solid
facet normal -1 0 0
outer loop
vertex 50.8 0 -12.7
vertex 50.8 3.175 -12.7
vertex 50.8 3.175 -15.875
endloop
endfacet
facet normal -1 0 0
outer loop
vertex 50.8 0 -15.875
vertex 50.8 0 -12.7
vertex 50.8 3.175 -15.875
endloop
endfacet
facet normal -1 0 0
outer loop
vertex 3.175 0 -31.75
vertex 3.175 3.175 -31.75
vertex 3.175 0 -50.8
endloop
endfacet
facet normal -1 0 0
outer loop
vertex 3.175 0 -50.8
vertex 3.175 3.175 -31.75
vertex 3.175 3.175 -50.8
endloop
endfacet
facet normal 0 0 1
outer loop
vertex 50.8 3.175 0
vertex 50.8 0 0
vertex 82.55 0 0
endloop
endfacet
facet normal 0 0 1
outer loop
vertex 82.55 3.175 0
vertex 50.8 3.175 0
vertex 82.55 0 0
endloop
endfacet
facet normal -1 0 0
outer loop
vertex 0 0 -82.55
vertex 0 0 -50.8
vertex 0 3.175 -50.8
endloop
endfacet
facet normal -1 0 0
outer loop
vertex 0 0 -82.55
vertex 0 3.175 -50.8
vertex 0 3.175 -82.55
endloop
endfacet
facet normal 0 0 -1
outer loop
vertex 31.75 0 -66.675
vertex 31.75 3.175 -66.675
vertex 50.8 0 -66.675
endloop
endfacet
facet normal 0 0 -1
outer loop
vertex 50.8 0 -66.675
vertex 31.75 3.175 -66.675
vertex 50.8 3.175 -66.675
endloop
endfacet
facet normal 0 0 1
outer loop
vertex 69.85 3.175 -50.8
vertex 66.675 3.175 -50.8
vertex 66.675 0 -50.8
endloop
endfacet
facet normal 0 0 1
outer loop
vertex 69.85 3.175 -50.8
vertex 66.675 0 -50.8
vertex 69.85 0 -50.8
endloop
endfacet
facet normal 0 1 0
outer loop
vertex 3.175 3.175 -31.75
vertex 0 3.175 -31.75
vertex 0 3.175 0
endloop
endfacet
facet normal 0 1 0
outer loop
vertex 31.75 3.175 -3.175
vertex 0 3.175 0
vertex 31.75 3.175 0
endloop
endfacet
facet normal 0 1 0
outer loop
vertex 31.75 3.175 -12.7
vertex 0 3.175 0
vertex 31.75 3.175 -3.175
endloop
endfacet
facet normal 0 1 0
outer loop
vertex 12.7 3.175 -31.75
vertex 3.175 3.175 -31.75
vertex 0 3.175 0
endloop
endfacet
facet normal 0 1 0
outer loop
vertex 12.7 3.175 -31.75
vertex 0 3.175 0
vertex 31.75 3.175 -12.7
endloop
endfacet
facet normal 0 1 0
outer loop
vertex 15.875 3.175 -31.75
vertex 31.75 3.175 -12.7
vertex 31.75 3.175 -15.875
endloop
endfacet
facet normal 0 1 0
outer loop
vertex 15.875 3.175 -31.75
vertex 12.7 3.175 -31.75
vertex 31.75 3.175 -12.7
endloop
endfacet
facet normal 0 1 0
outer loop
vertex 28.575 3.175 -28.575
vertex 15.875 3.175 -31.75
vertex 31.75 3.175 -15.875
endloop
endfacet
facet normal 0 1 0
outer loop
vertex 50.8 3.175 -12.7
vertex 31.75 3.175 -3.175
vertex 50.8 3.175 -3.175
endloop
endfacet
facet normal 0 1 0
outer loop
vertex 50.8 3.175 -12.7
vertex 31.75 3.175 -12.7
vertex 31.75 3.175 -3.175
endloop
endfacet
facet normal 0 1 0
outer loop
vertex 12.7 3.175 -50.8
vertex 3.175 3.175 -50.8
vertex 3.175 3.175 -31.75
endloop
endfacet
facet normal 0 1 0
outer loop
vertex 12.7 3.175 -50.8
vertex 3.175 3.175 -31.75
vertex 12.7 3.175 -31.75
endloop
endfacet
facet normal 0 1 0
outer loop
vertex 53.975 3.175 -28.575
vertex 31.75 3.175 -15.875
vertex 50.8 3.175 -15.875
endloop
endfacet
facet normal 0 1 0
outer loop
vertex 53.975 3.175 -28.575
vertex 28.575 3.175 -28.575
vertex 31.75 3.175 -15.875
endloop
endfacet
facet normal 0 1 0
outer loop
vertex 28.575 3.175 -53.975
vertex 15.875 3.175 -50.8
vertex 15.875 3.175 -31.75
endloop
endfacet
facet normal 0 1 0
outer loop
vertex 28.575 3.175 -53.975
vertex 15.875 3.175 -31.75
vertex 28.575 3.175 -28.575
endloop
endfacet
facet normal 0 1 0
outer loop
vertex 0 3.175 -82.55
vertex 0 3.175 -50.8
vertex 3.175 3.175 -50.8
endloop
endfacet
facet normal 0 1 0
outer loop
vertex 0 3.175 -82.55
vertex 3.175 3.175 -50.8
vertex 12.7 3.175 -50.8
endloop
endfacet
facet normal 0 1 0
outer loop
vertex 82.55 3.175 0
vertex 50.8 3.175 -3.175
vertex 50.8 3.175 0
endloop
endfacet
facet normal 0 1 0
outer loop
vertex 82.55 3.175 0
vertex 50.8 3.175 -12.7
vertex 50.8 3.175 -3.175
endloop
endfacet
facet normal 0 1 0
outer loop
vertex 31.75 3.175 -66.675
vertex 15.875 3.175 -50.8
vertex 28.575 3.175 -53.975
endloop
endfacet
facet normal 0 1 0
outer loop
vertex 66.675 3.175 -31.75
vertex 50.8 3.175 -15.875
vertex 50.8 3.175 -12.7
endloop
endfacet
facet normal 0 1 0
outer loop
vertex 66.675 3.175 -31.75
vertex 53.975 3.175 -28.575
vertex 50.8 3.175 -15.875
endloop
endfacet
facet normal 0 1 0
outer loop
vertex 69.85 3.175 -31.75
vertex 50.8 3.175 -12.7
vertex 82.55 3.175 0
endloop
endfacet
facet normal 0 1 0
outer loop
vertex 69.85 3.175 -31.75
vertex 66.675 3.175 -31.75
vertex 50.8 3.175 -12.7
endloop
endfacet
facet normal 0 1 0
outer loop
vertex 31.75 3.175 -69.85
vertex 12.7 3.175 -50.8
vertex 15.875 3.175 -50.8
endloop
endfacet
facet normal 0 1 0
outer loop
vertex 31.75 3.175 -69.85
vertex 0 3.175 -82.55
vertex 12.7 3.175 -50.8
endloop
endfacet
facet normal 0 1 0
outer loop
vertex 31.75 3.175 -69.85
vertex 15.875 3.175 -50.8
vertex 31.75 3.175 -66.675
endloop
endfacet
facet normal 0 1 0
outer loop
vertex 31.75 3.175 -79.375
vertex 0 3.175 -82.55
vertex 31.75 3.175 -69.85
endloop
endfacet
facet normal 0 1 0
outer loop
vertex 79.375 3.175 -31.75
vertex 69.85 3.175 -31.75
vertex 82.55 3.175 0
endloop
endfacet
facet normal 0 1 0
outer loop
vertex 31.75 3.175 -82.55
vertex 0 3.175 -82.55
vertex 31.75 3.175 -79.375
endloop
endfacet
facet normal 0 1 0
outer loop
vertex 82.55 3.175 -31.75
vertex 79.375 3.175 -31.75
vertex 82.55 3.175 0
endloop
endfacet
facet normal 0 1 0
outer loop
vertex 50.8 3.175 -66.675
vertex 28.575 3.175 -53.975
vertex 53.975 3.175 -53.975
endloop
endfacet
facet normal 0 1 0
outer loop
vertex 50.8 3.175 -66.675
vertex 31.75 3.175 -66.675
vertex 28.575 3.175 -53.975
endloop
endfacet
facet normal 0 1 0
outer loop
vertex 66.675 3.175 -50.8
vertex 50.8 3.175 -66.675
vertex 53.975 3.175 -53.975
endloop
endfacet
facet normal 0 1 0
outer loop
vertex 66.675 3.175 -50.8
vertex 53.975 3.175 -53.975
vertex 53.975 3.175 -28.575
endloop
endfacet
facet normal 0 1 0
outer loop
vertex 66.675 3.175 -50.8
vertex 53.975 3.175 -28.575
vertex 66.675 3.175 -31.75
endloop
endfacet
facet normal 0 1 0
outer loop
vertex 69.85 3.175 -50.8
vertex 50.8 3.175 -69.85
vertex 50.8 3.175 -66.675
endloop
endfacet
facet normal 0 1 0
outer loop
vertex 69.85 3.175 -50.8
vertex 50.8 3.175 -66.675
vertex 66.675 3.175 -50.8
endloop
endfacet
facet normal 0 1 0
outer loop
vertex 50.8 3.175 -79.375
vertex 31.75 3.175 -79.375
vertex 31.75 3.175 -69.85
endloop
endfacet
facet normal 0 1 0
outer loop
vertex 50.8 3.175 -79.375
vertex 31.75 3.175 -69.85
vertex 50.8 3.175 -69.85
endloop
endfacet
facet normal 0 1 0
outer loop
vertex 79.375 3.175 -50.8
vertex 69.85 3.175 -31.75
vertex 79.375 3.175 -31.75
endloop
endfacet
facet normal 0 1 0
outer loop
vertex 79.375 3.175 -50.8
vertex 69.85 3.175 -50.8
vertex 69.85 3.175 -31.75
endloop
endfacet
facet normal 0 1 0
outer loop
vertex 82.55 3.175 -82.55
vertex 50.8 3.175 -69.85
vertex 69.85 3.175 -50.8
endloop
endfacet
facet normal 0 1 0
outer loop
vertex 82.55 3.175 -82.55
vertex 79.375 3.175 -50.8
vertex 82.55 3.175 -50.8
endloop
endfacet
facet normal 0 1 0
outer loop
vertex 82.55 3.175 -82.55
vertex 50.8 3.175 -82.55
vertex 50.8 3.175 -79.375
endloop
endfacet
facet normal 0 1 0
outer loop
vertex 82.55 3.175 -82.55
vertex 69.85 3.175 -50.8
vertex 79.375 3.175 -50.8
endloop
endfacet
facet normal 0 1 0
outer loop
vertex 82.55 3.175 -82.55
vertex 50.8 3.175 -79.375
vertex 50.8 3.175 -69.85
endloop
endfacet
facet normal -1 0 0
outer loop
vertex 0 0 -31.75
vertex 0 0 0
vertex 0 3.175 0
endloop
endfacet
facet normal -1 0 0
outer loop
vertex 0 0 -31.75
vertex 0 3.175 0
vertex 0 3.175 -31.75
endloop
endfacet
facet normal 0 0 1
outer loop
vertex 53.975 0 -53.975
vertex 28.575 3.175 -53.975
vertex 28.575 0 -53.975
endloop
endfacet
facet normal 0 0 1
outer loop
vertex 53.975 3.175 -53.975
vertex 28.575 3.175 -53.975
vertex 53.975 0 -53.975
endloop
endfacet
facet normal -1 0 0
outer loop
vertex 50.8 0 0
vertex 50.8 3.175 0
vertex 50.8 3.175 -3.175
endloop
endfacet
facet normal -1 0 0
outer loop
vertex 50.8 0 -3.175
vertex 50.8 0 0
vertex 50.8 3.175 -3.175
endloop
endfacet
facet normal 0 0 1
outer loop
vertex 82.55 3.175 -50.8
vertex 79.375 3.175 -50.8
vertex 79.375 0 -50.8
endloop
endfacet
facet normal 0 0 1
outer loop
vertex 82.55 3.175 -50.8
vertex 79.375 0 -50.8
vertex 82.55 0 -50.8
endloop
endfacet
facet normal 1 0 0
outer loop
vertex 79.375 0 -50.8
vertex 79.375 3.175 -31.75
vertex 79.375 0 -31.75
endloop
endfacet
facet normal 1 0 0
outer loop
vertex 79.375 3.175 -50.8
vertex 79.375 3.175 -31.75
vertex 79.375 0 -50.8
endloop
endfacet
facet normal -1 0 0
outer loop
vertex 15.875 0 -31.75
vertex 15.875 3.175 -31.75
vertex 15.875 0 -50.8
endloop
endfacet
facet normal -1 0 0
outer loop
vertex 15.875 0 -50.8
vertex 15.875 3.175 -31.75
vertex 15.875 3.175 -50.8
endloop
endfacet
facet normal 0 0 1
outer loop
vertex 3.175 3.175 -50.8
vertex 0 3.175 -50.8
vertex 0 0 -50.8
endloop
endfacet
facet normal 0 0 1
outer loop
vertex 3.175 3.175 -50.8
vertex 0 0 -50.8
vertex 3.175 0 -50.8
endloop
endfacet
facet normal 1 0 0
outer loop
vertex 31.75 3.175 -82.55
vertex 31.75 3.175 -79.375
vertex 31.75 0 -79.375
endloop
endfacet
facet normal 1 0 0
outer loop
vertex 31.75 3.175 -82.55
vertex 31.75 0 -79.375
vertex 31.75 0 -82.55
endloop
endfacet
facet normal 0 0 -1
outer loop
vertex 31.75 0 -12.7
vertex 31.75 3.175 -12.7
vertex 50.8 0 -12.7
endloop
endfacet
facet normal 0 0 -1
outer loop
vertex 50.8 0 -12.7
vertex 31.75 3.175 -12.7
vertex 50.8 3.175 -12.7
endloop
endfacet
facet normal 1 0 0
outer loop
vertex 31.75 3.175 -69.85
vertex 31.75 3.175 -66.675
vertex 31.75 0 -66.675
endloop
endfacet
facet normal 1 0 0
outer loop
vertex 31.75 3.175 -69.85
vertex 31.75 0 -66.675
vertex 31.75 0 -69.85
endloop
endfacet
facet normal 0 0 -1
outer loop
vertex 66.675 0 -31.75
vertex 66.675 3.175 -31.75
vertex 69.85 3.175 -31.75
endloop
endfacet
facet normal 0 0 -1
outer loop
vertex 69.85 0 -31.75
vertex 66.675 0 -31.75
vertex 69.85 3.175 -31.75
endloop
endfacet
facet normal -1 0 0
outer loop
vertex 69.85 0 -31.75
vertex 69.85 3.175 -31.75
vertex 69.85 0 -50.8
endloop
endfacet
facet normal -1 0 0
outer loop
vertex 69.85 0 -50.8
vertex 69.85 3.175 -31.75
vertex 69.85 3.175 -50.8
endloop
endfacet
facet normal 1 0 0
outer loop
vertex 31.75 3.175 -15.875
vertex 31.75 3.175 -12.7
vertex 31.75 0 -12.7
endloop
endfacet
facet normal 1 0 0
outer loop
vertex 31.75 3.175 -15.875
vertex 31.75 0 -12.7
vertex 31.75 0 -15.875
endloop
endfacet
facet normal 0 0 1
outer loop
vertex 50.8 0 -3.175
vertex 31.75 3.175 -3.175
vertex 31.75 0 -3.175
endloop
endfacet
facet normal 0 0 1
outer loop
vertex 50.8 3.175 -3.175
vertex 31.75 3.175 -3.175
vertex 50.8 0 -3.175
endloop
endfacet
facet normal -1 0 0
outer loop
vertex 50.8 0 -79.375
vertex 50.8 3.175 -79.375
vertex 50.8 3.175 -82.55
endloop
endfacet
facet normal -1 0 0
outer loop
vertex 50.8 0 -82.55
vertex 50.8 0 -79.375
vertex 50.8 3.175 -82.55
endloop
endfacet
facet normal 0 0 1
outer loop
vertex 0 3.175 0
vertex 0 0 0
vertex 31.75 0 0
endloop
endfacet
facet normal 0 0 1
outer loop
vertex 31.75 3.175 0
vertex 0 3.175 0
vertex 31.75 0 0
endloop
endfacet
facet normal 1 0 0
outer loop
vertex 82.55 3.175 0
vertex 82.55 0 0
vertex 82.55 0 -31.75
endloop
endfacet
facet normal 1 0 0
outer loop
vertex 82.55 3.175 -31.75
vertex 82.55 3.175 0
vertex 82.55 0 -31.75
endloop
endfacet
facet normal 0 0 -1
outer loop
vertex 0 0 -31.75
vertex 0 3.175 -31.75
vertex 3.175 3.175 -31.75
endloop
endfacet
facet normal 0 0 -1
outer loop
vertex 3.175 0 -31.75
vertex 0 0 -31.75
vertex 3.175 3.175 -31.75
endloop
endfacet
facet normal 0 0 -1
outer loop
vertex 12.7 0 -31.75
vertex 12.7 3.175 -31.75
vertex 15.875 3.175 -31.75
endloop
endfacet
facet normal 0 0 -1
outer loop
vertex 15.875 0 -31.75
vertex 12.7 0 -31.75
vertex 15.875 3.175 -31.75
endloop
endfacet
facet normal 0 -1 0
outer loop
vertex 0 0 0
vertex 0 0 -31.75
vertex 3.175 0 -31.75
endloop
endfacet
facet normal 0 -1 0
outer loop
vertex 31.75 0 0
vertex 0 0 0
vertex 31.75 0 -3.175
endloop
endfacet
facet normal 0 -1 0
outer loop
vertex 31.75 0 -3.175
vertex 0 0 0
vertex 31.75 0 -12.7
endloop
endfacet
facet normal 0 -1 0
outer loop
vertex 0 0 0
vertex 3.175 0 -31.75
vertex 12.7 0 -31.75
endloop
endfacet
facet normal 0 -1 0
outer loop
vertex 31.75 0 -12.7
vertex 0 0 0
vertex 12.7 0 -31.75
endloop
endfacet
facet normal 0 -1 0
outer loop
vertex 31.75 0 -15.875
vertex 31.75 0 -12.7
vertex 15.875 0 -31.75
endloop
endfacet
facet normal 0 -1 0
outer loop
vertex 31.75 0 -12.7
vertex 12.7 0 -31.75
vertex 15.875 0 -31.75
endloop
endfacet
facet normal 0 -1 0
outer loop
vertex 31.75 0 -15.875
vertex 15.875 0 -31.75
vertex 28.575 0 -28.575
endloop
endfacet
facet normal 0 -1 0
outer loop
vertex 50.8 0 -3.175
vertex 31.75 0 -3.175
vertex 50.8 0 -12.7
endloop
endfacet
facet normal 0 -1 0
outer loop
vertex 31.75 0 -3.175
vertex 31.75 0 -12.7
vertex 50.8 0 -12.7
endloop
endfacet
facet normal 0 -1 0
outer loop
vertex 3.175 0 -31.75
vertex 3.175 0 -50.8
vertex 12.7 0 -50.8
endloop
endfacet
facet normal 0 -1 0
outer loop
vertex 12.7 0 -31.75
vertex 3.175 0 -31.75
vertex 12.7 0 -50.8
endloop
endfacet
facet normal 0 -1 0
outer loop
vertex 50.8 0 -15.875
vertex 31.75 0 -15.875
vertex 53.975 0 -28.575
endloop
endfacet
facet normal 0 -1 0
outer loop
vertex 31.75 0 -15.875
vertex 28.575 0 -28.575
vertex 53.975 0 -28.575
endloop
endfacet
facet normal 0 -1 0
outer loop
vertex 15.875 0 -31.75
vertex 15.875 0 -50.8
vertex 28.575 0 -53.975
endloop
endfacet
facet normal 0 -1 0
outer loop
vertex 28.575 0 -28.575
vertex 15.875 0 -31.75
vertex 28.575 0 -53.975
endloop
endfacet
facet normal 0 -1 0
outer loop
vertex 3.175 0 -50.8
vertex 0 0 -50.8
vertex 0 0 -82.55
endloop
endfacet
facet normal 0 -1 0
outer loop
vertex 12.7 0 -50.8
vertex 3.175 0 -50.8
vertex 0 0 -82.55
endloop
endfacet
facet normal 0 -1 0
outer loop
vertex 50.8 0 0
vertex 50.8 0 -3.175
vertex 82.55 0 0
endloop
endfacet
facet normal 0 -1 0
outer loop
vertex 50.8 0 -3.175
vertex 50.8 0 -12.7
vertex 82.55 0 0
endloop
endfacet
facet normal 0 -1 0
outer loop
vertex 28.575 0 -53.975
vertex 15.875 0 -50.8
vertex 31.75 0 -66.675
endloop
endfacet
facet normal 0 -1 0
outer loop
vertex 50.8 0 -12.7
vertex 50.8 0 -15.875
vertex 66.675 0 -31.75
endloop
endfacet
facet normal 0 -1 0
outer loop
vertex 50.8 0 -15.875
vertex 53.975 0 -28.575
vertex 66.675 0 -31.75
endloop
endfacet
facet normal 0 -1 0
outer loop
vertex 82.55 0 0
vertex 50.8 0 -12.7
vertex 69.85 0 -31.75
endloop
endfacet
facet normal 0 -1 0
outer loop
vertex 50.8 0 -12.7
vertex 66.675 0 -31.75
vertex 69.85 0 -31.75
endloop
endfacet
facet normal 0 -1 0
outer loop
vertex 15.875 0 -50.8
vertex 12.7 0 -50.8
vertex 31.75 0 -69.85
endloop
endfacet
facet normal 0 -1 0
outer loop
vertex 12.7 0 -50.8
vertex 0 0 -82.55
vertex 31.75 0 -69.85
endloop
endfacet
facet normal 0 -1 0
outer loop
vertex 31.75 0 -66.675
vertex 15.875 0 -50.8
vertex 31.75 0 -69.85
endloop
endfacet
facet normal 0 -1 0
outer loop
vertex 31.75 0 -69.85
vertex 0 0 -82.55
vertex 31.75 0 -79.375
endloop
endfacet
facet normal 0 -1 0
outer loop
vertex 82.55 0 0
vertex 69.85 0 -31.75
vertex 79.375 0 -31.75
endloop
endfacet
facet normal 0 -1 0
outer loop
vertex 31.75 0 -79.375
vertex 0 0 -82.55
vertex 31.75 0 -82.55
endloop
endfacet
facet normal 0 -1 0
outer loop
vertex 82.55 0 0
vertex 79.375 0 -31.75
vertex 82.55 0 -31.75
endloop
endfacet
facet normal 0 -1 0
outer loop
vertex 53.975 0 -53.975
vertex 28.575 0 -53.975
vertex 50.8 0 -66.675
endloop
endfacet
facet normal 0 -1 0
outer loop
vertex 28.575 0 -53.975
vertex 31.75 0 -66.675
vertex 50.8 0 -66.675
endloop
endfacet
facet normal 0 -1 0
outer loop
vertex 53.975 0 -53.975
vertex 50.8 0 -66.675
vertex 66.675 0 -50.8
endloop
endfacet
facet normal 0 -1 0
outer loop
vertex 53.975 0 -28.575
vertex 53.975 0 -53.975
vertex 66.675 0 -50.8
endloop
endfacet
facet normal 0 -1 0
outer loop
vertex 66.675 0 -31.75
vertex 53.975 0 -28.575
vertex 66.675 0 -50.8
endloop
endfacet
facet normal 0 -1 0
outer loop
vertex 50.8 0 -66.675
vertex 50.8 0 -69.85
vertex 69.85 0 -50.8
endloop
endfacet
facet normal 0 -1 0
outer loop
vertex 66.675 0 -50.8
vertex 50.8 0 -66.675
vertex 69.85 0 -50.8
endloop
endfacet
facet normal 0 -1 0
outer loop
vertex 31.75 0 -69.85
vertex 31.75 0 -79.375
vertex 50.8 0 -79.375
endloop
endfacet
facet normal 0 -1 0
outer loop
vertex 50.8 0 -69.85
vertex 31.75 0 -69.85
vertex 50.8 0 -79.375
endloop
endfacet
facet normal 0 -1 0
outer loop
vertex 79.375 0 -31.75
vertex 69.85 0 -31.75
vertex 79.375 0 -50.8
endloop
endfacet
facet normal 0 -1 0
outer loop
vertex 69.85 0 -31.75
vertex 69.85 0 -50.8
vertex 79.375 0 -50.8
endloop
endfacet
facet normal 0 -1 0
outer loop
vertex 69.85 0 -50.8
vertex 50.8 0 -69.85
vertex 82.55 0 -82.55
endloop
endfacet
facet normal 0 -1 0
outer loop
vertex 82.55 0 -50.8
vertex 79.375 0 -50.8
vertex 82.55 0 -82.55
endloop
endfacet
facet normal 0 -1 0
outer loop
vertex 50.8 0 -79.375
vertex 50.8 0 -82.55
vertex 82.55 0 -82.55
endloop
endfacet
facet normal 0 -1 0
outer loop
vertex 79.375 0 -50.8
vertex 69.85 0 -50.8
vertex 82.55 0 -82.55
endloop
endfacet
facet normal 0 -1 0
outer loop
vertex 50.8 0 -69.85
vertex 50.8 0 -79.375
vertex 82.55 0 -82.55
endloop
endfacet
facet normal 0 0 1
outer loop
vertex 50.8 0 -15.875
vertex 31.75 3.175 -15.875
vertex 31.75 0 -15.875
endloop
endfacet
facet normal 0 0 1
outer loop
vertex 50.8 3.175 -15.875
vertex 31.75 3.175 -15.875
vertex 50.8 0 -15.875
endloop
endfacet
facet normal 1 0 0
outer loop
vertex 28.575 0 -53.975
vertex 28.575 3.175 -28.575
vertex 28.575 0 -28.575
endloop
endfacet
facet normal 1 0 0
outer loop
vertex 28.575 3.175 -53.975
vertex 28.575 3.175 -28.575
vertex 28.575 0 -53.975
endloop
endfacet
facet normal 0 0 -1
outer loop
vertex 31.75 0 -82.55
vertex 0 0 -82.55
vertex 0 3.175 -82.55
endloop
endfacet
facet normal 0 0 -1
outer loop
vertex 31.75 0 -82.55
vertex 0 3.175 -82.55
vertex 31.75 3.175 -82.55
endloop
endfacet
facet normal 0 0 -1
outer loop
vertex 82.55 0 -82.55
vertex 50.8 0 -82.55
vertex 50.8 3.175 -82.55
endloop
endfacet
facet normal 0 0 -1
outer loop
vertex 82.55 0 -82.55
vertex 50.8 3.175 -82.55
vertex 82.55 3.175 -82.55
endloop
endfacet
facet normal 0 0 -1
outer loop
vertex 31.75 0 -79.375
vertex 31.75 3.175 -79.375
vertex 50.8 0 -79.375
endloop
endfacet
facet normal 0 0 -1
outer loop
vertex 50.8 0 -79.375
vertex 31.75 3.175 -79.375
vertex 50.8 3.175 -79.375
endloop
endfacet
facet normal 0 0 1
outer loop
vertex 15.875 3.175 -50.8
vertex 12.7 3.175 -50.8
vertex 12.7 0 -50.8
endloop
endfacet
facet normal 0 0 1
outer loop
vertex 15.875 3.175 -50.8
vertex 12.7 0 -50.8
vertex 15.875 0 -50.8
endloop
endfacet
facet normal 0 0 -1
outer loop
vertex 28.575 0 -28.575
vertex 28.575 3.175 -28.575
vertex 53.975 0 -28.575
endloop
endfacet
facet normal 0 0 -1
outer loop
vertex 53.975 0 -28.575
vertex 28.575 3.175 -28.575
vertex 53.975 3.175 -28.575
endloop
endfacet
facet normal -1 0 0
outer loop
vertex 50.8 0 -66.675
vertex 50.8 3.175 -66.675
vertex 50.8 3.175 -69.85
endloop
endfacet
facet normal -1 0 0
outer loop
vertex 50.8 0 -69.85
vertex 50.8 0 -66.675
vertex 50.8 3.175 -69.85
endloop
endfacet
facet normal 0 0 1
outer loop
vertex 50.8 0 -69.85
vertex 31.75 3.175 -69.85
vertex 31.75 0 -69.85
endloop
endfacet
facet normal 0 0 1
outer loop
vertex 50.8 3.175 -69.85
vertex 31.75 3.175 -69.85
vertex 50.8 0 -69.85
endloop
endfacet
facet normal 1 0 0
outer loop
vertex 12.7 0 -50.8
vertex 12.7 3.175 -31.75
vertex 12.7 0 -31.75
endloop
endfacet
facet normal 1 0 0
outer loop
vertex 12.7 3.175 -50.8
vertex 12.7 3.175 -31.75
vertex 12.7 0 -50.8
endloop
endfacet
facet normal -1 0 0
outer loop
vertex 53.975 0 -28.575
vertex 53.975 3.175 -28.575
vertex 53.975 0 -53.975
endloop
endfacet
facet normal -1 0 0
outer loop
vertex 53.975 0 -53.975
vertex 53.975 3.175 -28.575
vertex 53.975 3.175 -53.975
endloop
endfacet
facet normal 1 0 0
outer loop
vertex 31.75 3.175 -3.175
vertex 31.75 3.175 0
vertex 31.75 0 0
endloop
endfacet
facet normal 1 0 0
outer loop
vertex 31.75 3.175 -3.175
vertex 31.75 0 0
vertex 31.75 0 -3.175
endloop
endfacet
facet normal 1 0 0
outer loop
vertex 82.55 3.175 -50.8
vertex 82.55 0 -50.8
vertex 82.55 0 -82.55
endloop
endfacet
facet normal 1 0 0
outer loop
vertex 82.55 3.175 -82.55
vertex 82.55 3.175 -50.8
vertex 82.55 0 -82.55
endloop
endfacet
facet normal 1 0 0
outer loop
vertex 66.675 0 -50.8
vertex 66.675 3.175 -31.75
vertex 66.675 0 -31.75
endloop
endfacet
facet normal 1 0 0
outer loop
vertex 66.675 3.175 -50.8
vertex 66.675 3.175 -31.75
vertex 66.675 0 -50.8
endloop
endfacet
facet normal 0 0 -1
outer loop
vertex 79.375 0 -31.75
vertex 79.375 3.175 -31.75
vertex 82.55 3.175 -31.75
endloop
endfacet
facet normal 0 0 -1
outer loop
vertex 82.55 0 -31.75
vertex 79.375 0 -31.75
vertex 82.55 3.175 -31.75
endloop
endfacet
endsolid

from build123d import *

# Parameters (mm, degrees)
SKETCH1_W           = 82.55
SKETCH1_H           = 82.55
BOSS_EXTRUDE1_DEPTH = 3.175
SKETCH2_W           = 25.4
SKETCH2_H           = 25.4
SKETCH2_W_2         = 19.05
SKETCH2_H_2         = 3.175
SKETCH2_W_3         = 3.175
SKETCH2_H_3         = 19.05
CUT_EXTRUDE1_DEPTH  = 3.175
SKETCH3_W           = 19.05
SKETCH3_H           = 3.175
SKETCH3_W_2         = 3.175
SKETCH3_H_2         = 19.05
CUT_EXTRUDE2_DEPTH  = 3.175


with BuildPart() as part:
    # Sketch1 → Boss-Extrude1 (new body)
    with BuildSketch(Plane(origin=(0, 0, 0), x_dir=(1, 0, 0), z_dir=(0, 1, 0))):
        with Locations((41.275, 41.275)):
            Rectangle(SKETCH1_W, SKETCH1_H)
    extrude(amount=BOSS_EXTRUDE1_DEPTH)

    # Sketch2 → Cut-Extrude1 (cut)
    with BuildSketch(Plane(origin=(0, 3.175, 0), x_dir=(1, 0, 0), z_dir=(0, 1, 0))):
        with Locations((41.275, 41.275)):
            Rectangle(SKETCH2_W, SKETCH2_H)
        with Locations((41.275, 68.2625)):
            Rectangle(SKETCH2_W_2, SKETCH2_H_2)
        with Locations((14.2875, 41.275)):
            Rectangle(SKETCH2_W_3, SKETCH2_H_3)
        with Locations((68.2625, 41.275)):
            Rectangle(SKETCH2_W_3, SKETCH2_H_3)
        with Locations((41.275, 14.2875)):
            Rectangle(SKETCH2_W_2, SKETCH2_H_2)
    extrude(amount=-CUT_EXTRUDE1_DEPTH, mode=Mode.SUBTRACT)

    # Sketch3 → Cut-Extrude2 (cut)
    with BuildSketch(Plane(origin=(0, 3.175, 0), x_dir=(1, 0, 0), z_dir=(0, 1, 0))):
        with Locations((41.275, 80.9625)):
            Rectangle(SKETCH3_W, SKETCH3_H)
        with Locations((80.9625, 41.275)):
            Rectangle(SKETCH3_W_2, SKETCH3_H_2)
        with Locations((41.275, 1.5875)):
            Rectangle(SKETCH3_W, SKETCH3_H)
        with Locations((1.5875, 41.275)):
            Rectangle(SKETCH3_W_2, SKETCH3_H_2)
    extrude(amount=-CUT_EXTRUDE2_DEPTH, mode=Mode.SUBTRACT)


solid = part.part
